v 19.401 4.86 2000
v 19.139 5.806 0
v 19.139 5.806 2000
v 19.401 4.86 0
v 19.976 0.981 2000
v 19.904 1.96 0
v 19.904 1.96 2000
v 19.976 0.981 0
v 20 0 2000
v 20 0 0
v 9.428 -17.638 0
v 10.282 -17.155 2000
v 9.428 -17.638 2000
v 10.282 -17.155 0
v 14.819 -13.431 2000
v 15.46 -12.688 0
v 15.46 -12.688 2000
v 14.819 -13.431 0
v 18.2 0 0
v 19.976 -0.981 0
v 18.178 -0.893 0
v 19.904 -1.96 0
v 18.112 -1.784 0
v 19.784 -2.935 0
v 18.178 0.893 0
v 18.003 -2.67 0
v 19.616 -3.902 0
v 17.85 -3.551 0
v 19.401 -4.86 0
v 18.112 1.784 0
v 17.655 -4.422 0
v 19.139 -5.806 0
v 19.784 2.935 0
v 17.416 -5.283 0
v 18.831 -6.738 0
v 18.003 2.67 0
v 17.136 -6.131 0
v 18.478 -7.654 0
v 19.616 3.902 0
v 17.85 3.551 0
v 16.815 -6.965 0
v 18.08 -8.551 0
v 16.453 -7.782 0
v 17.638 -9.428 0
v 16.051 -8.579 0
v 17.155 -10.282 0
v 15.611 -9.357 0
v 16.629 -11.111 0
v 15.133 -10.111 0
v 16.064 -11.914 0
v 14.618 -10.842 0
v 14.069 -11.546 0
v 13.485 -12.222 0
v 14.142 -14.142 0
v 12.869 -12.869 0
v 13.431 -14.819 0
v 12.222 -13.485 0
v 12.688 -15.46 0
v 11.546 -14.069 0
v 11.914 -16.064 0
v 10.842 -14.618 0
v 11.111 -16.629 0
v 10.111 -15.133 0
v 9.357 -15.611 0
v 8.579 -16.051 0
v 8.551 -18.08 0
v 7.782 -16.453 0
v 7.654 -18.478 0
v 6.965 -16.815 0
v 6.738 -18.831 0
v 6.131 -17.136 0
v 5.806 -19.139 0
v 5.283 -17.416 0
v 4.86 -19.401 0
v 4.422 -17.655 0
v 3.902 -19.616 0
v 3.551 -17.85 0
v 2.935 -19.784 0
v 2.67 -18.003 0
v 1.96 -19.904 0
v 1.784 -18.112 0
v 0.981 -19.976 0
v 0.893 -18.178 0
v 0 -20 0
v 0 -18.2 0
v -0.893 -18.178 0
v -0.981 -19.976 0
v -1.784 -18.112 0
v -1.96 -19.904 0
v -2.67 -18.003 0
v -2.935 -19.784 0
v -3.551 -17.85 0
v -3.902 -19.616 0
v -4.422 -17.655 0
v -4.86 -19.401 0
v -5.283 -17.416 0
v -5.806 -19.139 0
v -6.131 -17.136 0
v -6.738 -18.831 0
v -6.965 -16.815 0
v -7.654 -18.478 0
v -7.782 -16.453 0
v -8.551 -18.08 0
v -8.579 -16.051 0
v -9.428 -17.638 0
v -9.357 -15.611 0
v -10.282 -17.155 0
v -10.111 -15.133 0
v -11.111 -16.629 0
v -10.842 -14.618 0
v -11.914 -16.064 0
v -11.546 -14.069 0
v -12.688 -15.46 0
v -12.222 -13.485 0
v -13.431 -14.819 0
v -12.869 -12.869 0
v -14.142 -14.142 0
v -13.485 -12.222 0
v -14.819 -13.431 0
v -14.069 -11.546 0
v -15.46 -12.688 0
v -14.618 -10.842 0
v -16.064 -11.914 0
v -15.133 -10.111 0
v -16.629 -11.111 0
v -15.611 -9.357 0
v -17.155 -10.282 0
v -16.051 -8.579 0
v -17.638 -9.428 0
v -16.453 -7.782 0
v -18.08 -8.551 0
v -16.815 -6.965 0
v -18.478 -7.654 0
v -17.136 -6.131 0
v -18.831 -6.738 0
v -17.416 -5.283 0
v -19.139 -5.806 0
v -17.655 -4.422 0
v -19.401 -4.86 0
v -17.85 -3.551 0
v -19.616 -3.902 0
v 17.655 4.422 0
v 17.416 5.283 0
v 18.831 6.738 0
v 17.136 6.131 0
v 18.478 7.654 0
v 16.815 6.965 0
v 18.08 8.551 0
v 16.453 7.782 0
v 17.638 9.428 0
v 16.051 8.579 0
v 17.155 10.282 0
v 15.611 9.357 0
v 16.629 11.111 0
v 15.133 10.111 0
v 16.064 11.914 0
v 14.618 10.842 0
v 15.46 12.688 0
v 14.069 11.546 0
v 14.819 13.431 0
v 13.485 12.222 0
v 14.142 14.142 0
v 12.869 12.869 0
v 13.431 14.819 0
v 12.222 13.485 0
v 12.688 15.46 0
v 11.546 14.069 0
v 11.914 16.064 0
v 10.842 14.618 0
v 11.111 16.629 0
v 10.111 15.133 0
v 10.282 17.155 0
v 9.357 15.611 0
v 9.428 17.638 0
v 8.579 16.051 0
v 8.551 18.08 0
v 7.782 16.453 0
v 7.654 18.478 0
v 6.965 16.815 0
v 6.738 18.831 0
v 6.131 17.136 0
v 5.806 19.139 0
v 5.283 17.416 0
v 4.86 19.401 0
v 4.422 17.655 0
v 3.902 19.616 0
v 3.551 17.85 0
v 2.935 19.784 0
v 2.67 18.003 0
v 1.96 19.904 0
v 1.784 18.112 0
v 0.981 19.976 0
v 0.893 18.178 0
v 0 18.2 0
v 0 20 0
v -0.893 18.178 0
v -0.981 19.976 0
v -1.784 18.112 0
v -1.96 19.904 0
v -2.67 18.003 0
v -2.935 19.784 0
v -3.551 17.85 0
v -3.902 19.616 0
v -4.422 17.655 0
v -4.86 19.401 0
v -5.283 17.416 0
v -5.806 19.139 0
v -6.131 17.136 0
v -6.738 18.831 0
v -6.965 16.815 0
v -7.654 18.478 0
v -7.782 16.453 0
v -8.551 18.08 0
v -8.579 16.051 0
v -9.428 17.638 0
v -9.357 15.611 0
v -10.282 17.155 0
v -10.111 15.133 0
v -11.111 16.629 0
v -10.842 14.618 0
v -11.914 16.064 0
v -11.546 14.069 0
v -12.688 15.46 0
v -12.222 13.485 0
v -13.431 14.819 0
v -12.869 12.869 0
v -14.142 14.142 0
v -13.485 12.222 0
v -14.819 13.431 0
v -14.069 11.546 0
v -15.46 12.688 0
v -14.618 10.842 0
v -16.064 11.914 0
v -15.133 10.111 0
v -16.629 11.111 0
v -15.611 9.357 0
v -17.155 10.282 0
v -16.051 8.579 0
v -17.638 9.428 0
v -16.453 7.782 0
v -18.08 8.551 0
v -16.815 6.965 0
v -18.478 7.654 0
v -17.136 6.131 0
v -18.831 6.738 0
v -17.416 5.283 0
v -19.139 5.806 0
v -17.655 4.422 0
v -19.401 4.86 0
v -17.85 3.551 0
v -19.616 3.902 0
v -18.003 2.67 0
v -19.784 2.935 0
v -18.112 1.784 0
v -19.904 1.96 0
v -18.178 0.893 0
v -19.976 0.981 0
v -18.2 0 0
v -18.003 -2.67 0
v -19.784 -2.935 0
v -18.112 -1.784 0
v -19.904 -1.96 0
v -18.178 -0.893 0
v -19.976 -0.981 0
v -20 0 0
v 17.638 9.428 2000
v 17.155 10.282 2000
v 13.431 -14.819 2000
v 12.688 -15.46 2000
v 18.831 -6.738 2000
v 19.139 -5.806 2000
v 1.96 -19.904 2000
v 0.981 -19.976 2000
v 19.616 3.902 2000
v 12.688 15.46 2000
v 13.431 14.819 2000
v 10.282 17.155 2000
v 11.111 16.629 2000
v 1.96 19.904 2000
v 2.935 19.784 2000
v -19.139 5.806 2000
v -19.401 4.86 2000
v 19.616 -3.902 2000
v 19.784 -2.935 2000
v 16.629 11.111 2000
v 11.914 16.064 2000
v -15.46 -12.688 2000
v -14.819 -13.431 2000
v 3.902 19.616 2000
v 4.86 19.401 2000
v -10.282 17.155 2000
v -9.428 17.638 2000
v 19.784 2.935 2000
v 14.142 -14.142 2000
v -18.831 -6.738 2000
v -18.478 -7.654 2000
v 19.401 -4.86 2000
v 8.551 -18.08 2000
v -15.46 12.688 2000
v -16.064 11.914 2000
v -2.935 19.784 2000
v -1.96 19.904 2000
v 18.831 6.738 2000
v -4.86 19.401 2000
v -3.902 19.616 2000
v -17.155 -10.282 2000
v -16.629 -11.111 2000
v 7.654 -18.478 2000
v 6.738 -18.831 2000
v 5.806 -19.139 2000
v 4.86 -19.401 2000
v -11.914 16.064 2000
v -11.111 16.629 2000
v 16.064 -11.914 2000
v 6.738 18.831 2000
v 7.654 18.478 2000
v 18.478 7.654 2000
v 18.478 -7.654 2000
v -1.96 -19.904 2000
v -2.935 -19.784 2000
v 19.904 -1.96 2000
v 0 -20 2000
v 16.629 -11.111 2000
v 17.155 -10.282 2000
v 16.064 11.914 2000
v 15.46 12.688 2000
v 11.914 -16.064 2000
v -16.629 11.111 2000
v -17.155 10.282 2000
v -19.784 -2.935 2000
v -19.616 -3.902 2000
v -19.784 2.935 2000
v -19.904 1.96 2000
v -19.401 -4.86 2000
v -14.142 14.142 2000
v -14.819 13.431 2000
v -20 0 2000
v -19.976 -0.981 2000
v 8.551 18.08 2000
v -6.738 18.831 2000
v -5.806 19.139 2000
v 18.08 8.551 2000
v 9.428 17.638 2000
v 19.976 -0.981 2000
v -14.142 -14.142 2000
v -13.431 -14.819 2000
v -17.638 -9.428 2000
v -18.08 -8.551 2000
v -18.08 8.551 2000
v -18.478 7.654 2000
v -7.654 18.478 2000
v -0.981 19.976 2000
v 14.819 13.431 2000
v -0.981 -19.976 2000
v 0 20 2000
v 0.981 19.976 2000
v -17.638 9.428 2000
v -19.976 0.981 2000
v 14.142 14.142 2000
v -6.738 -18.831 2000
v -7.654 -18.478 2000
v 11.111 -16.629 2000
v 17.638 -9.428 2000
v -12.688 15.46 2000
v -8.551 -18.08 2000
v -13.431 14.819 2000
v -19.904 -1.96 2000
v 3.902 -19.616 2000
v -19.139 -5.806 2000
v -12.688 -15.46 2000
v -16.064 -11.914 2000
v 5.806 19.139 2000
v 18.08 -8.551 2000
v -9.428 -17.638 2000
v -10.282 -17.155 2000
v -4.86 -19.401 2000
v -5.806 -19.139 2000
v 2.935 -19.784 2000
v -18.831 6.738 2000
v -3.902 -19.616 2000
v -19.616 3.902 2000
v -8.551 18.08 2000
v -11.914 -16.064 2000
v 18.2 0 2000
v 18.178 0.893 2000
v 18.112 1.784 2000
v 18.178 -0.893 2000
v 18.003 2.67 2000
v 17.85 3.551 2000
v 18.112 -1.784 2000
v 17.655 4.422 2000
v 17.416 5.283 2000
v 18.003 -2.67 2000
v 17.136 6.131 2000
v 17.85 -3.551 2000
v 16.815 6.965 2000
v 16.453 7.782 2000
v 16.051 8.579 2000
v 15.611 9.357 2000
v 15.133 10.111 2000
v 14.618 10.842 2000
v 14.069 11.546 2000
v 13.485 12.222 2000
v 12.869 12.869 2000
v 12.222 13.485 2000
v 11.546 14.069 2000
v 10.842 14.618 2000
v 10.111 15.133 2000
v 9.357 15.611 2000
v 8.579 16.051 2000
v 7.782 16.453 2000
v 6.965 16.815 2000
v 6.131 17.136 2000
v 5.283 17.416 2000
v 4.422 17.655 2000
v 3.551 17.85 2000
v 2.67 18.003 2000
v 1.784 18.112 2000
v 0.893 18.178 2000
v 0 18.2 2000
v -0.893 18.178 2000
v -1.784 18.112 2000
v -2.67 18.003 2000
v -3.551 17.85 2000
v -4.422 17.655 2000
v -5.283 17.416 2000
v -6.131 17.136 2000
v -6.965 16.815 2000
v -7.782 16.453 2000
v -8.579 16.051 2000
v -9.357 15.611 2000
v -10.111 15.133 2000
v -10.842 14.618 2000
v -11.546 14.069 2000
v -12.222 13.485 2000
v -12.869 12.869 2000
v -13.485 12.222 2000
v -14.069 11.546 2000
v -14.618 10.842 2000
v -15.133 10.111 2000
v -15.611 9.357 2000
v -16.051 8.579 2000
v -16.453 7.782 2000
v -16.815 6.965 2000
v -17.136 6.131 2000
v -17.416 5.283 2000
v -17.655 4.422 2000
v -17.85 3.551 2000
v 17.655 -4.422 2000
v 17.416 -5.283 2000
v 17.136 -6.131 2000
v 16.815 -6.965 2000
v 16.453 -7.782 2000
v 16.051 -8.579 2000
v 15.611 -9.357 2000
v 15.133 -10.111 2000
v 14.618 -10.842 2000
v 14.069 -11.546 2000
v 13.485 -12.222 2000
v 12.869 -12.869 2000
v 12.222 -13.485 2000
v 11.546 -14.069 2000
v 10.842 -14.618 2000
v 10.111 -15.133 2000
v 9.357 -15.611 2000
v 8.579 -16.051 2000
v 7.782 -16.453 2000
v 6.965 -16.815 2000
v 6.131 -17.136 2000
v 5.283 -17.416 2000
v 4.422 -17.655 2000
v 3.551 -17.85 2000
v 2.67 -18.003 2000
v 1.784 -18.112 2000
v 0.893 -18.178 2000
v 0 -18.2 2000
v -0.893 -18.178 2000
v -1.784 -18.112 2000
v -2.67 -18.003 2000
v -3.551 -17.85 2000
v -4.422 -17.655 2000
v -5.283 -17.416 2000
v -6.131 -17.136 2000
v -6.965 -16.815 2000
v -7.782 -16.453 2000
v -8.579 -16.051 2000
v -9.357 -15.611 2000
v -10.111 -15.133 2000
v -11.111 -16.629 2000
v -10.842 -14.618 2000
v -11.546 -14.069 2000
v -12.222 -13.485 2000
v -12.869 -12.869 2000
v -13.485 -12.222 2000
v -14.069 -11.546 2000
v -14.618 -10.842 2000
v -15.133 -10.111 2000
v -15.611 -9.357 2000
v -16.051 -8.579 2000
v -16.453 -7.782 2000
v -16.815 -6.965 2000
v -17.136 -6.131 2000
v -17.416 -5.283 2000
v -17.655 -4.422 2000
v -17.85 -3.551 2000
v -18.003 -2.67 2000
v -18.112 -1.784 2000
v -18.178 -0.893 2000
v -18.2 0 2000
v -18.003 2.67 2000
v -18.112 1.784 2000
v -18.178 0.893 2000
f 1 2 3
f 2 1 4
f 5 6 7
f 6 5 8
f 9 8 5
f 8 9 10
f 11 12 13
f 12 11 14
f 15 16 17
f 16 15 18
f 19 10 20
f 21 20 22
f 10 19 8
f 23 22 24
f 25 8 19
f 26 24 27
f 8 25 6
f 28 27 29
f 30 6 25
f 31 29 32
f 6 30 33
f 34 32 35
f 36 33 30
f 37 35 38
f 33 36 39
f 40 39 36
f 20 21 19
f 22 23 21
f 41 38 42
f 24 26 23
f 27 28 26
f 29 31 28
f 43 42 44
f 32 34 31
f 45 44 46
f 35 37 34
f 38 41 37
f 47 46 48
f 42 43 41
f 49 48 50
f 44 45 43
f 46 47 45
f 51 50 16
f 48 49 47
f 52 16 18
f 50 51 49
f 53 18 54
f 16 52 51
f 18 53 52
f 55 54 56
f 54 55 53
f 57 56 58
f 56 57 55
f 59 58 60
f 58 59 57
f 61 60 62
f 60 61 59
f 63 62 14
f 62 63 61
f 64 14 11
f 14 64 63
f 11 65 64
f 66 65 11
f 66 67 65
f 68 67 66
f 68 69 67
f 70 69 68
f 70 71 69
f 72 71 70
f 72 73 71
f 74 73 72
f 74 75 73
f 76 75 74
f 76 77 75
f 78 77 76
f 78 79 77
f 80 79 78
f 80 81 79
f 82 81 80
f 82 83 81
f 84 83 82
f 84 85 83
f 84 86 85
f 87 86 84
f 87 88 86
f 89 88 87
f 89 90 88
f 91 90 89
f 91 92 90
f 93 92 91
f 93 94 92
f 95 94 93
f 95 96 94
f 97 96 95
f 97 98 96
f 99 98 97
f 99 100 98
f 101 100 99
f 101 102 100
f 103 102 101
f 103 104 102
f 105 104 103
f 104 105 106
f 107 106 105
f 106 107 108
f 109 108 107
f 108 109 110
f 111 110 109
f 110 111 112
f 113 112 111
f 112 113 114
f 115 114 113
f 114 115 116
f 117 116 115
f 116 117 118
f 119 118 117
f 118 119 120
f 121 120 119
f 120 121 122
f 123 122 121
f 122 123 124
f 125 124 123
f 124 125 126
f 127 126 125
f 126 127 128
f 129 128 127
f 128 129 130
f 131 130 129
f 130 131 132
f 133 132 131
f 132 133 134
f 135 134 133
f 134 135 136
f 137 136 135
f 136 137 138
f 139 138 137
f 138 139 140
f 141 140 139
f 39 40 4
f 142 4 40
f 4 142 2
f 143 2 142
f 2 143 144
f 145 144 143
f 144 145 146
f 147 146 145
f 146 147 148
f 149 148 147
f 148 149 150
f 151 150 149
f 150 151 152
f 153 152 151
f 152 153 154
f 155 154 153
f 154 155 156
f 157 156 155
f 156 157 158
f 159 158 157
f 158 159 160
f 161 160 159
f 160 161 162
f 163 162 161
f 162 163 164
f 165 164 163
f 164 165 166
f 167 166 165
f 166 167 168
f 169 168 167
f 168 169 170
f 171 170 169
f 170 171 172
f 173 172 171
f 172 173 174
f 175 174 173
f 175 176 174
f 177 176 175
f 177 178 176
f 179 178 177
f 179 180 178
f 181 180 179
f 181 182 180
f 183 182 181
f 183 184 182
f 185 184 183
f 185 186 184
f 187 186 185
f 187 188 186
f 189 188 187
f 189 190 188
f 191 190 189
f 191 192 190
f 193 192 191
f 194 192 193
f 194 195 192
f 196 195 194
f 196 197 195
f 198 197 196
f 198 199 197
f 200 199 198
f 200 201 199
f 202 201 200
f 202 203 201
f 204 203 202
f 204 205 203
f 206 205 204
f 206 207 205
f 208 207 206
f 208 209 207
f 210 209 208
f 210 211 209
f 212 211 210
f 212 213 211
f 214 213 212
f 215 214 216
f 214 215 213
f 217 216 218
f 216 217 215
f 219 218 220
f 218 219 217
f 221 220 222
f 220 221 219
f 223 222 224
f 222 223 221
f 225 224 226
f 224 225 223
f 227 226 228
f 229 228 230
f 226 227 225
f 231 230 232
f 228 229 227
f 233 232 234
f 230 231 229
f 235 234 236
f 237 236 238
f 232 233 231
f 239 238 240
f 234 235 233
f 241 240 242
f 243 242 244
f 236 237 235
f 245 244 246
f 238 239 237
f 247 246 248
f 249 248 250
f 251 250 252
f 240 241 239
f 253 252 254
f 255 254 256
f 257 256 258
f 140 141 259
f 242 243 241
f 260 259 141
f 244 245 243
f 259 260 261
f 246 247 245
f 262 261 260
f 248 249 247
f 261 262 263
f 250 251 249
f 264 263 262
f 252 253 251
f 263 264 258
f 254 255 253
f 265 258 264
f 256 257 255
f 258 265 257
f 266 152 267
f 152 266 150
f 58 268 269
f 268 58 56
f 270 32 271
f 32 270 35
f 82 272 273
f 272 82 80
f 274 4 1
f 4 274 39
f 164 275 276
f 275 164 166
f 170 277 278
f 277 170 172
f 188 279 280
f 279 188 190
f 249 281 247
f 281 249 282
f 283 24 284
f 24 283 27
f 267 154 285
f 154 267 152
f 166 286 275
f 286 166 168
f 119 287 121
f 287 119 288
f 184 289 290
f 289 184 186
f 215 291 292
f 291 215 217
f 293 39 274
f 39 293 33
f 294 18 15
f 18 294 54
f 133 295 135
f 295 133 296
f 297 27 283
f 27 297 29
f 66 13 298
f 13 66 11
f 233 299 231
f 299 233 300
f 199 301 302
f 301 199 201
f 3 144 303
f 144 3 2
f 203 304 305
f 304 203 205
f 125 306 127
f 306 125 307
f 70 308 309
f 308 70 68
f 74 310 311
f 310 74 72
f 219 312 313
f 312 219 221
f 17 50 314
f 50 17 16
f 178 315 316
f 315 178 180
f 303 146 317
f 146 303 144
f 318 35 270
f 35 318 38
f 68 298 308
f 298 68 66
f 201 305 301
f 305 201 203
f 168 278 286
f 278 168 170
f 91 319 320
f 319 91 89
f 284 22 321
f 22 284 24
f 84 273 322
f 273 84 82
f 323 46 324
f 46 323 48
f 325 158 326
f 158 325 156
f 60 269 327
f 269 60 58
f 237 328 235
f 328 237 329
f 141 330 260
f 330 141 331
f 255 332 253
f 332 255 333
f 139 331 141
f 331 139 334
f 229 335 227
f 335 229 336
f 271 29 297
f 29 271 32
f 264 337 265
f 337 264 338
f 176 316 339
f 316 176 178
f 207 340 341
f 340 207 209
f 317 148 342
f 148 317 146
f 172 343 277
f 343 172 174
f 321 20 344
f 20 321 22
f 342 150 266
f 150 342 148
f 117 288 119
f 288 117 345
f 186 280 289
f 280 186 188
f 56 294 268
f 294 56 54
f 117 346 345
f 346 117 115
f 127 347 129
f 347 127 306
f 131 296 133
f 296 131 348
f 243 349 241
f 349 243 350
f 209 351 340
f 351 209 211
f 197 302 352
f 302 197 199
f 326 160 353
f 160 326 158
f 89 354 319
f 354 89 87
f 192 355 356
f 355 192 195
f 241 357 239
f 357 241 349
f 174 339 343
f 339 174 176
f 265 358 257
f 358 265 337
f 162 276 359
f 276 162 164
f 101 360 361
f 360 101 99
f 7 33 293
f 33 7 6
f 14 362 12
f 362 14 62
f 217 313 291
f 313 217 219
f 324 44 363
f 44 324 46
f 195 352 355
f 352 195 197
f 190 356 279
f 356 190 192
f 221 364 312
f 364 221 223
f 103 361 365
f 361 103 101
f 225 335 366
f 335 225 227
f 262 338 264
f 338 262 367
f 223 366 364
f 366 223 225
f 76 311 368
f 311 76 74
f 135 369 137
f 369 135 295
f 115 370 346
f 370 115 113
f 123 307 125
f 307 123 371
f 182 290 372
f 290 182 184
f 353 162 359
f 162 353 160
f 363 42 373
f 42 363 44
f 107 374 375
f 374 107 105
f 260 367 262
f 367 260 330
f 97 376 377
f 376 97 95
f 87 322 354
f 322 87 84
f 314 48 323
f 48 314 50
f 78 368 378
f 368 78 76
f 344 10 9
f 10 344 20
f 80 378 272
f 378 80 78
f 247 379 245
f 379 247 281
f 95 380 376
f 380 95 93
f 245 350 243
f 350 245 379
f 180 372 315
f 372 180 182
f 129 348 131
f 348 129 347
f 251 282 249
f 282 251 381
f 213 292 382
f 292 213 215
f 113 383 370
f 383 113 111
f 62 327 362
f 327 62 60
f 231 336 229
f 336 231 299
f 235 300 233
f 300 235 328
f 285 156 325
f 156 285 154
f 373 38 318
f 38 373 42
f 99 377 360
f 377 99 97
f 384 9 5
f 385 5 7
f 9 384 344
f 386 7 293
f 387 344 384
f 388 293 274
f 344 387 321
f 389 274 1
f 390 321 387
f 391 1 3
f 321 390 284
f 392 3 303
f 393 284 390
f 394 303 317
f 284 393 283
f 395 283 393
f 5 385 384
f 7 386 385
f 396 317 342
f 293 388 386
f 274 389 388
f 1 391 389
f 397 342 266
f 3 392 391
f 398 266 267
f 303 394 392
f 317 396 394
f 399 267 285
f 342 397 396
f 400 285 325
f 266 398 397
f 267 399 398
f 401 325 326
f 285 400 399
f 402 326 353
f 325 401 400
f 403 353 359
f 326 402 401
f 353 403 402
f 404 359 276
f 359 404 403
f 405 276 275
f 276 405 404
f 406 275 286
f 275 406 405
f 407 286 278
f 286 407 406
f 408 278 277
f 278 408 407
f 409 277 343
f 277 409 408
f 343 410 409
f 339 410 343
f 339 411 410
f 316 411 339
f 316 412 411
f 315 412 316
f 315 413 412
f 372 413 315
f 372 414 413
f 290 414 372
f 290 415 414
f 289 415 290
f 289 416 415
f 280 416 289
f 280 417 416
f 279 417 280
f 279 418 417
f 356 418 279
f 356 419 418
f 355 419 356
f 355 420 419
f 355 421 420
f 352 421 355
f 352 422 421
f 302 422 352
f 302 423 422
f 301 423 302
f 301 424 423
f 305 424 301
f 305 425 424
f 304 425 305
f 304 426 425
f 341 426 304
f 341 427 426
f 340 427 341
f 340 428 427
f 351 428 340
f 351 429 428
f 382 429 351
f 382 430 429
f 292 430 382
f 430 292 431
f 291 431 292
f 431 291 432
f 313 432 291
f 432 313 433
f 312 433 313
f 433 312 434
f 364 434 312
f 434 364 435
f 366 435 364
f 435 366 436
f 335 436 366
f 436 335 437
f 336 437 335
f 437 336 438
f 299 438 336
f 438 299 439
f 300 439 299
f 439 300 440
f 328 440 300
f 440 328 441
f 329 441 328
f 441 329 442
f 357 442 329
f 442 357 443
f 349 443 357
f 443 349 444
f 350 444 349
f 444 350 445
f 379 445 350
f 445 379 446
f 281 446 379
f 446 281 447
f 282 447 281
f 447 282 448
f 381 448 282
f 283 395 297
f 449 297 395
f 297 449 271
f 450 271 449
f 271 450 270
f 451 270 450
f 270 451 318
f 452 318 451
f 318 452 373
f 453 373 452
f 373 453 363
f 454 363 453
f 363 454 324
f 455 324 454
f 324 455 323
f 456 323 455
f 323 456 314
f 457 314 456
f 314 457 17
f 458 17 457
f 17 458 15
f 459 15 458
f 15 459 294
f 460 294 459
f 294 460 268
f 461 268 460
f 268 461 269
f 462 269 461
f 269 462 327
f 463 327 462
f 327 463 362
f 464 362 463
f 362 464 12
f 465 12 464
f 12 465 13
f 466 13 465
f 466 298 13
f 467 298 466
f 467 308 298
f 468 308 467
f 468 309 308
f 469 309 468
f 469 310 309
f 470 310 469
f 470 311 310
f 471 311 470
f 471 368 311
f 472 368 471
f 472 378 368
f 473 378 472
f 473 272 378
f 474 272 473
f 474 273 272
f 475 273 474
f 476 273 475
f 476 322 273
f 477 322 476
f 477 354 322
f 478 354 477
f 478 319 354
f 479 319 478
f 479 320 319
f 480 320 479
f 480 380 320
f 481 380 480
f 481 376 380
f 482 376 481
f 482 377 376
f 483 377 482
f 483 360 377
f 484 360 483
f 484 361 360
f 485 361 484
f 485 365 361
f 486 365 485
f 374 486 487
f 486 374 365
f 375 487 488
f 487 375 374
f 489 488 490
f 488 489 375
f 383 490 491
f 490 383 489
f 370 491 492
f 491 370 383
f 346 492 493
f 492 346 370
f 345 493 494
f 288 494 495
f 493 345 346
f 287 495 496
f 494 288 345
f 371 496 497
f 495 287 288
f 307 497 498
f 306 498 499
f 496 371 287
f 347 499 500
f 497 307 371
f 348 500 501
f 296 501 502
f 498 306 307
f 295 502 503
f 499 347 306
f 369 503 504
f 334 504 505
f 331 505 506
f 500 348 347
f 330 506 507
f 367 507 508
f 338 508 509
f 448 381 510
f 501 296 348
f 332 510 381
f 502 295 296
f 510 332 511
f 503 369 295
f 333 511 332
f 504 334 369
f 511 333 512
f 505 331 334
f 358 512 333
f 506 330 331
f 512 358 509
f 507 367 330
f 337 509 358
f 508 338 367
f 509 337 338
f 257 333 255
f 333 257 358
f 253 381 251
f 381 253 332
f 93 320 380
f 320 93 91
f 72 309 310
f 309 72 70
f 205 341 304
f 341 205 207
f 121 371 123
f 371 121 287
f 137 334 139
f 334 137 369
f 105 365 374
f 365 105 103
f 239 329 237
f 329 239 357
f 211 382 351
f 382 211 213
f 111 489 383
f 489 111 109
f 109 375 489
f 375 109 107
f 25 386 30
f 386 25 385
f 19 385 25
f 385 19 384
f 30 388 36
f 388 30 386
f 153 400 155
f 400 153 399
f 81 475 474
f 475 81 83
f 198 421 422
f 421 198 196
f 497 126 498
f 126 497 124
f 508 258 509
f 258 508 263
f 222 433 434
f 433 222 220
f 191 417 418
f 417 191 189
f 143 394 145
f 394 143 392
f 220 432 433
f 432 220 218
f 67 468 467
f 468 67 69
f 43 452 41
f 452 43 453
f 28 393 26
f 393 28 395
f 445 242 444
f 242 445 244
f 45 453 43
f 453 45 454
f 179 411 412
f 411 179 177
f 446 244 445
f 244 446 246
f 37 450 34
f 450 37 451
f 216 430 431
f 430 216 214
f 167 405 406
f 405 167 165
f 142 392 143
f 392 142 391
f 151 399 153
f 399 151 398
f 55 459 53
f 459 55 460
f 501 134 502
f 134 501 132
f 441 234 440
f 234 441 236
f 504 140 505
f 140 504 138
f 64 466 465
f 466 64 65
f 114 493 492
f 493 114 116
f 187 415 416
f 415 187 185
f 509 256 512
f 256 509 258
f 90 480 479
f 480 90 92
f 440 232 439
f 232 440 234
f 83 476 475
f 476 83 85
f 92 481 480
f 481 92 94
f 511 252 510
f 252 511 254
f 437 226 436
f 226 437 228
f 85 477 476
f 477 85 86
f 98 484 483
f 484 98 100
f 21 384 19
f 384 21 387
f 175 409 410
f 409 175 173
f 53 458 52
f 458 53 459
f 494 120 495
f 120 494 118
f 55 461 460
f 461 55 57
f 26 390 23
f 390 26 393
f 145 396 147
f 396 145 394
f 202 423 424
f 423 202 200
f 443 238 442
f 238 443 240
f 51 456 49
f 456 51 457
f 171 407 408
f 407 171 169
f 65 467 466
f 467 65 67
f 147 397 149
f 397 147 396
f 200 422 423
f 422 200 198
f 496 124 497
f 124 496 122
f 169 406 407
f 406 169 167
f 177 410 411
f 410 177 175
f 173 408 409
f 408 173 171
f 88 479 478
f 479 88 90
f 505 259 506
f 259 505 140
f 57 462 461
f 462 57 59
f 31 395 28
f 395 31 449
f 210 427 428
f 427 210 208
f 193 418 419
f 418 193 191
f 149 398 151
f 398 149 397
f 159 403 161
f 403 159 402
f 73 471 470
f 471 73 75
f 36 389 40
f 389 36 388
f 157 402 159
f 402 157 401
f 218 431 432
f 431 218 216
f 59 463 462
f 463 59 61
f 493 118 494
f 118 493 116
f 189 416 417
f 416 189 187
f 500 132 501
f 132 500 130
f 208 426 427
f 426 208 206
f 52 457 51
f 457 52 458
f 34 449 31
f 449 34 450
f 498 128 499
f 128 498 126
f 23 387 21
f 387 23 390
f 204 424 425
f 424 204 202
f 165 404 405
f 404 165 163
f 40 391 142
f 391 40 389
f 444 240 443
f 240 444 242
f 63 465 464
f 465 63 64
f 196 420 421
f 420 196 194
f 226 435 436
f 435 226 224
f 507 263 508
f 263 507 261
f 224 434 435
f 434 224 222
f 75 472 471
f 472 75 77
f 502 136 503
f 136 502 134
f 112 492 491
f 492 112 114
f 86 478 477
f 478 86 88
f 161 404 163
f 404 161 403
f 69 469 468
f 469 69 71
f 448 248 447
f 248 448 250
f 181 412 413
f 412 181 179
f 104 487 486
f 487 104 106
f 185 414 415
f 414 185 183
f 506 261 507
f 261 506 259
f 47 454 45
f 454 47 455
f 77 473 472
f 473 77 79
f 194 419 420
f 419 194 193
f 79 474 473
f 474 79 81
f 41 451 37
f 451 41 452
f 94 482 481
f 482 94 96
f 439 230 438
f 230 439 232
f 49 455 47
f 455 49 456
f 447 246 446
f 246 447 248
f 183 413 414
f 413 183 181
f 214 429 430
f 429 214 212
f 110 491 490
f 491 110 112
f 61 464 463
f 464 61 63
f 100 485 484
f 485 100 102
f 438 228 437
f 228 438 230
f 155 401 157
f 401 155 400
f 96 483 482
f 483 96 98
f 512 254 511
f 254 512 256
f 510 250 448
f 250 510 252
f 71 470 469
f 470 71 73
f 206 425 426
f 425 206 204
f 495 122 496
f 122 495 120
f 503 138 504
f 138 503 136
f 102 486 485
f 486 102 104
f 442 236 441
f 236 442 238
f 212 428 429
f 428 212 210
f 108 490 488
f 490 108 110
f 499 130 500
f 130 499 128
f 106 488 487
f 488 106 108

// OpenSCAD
$fn = 128;

// HT pipe (approx.) - HT 40, length 2000 mm
// Typical HT 40 dimensions (approx): OD 40 mm, wall 1.8 mm
// Adjust if you have exact manufacturer specs.
od = 40;
wall = 1.8;
id = od - 2*wall;
len = 2000;

module ht_pipe(od, id, len) {
    difference() {
        cylinder(h = len, d = od);
        translate([0,0,-0.5])
            cylinder(h = len + 1, d = id);
    }
}

ht_pipe(od, id, len);
